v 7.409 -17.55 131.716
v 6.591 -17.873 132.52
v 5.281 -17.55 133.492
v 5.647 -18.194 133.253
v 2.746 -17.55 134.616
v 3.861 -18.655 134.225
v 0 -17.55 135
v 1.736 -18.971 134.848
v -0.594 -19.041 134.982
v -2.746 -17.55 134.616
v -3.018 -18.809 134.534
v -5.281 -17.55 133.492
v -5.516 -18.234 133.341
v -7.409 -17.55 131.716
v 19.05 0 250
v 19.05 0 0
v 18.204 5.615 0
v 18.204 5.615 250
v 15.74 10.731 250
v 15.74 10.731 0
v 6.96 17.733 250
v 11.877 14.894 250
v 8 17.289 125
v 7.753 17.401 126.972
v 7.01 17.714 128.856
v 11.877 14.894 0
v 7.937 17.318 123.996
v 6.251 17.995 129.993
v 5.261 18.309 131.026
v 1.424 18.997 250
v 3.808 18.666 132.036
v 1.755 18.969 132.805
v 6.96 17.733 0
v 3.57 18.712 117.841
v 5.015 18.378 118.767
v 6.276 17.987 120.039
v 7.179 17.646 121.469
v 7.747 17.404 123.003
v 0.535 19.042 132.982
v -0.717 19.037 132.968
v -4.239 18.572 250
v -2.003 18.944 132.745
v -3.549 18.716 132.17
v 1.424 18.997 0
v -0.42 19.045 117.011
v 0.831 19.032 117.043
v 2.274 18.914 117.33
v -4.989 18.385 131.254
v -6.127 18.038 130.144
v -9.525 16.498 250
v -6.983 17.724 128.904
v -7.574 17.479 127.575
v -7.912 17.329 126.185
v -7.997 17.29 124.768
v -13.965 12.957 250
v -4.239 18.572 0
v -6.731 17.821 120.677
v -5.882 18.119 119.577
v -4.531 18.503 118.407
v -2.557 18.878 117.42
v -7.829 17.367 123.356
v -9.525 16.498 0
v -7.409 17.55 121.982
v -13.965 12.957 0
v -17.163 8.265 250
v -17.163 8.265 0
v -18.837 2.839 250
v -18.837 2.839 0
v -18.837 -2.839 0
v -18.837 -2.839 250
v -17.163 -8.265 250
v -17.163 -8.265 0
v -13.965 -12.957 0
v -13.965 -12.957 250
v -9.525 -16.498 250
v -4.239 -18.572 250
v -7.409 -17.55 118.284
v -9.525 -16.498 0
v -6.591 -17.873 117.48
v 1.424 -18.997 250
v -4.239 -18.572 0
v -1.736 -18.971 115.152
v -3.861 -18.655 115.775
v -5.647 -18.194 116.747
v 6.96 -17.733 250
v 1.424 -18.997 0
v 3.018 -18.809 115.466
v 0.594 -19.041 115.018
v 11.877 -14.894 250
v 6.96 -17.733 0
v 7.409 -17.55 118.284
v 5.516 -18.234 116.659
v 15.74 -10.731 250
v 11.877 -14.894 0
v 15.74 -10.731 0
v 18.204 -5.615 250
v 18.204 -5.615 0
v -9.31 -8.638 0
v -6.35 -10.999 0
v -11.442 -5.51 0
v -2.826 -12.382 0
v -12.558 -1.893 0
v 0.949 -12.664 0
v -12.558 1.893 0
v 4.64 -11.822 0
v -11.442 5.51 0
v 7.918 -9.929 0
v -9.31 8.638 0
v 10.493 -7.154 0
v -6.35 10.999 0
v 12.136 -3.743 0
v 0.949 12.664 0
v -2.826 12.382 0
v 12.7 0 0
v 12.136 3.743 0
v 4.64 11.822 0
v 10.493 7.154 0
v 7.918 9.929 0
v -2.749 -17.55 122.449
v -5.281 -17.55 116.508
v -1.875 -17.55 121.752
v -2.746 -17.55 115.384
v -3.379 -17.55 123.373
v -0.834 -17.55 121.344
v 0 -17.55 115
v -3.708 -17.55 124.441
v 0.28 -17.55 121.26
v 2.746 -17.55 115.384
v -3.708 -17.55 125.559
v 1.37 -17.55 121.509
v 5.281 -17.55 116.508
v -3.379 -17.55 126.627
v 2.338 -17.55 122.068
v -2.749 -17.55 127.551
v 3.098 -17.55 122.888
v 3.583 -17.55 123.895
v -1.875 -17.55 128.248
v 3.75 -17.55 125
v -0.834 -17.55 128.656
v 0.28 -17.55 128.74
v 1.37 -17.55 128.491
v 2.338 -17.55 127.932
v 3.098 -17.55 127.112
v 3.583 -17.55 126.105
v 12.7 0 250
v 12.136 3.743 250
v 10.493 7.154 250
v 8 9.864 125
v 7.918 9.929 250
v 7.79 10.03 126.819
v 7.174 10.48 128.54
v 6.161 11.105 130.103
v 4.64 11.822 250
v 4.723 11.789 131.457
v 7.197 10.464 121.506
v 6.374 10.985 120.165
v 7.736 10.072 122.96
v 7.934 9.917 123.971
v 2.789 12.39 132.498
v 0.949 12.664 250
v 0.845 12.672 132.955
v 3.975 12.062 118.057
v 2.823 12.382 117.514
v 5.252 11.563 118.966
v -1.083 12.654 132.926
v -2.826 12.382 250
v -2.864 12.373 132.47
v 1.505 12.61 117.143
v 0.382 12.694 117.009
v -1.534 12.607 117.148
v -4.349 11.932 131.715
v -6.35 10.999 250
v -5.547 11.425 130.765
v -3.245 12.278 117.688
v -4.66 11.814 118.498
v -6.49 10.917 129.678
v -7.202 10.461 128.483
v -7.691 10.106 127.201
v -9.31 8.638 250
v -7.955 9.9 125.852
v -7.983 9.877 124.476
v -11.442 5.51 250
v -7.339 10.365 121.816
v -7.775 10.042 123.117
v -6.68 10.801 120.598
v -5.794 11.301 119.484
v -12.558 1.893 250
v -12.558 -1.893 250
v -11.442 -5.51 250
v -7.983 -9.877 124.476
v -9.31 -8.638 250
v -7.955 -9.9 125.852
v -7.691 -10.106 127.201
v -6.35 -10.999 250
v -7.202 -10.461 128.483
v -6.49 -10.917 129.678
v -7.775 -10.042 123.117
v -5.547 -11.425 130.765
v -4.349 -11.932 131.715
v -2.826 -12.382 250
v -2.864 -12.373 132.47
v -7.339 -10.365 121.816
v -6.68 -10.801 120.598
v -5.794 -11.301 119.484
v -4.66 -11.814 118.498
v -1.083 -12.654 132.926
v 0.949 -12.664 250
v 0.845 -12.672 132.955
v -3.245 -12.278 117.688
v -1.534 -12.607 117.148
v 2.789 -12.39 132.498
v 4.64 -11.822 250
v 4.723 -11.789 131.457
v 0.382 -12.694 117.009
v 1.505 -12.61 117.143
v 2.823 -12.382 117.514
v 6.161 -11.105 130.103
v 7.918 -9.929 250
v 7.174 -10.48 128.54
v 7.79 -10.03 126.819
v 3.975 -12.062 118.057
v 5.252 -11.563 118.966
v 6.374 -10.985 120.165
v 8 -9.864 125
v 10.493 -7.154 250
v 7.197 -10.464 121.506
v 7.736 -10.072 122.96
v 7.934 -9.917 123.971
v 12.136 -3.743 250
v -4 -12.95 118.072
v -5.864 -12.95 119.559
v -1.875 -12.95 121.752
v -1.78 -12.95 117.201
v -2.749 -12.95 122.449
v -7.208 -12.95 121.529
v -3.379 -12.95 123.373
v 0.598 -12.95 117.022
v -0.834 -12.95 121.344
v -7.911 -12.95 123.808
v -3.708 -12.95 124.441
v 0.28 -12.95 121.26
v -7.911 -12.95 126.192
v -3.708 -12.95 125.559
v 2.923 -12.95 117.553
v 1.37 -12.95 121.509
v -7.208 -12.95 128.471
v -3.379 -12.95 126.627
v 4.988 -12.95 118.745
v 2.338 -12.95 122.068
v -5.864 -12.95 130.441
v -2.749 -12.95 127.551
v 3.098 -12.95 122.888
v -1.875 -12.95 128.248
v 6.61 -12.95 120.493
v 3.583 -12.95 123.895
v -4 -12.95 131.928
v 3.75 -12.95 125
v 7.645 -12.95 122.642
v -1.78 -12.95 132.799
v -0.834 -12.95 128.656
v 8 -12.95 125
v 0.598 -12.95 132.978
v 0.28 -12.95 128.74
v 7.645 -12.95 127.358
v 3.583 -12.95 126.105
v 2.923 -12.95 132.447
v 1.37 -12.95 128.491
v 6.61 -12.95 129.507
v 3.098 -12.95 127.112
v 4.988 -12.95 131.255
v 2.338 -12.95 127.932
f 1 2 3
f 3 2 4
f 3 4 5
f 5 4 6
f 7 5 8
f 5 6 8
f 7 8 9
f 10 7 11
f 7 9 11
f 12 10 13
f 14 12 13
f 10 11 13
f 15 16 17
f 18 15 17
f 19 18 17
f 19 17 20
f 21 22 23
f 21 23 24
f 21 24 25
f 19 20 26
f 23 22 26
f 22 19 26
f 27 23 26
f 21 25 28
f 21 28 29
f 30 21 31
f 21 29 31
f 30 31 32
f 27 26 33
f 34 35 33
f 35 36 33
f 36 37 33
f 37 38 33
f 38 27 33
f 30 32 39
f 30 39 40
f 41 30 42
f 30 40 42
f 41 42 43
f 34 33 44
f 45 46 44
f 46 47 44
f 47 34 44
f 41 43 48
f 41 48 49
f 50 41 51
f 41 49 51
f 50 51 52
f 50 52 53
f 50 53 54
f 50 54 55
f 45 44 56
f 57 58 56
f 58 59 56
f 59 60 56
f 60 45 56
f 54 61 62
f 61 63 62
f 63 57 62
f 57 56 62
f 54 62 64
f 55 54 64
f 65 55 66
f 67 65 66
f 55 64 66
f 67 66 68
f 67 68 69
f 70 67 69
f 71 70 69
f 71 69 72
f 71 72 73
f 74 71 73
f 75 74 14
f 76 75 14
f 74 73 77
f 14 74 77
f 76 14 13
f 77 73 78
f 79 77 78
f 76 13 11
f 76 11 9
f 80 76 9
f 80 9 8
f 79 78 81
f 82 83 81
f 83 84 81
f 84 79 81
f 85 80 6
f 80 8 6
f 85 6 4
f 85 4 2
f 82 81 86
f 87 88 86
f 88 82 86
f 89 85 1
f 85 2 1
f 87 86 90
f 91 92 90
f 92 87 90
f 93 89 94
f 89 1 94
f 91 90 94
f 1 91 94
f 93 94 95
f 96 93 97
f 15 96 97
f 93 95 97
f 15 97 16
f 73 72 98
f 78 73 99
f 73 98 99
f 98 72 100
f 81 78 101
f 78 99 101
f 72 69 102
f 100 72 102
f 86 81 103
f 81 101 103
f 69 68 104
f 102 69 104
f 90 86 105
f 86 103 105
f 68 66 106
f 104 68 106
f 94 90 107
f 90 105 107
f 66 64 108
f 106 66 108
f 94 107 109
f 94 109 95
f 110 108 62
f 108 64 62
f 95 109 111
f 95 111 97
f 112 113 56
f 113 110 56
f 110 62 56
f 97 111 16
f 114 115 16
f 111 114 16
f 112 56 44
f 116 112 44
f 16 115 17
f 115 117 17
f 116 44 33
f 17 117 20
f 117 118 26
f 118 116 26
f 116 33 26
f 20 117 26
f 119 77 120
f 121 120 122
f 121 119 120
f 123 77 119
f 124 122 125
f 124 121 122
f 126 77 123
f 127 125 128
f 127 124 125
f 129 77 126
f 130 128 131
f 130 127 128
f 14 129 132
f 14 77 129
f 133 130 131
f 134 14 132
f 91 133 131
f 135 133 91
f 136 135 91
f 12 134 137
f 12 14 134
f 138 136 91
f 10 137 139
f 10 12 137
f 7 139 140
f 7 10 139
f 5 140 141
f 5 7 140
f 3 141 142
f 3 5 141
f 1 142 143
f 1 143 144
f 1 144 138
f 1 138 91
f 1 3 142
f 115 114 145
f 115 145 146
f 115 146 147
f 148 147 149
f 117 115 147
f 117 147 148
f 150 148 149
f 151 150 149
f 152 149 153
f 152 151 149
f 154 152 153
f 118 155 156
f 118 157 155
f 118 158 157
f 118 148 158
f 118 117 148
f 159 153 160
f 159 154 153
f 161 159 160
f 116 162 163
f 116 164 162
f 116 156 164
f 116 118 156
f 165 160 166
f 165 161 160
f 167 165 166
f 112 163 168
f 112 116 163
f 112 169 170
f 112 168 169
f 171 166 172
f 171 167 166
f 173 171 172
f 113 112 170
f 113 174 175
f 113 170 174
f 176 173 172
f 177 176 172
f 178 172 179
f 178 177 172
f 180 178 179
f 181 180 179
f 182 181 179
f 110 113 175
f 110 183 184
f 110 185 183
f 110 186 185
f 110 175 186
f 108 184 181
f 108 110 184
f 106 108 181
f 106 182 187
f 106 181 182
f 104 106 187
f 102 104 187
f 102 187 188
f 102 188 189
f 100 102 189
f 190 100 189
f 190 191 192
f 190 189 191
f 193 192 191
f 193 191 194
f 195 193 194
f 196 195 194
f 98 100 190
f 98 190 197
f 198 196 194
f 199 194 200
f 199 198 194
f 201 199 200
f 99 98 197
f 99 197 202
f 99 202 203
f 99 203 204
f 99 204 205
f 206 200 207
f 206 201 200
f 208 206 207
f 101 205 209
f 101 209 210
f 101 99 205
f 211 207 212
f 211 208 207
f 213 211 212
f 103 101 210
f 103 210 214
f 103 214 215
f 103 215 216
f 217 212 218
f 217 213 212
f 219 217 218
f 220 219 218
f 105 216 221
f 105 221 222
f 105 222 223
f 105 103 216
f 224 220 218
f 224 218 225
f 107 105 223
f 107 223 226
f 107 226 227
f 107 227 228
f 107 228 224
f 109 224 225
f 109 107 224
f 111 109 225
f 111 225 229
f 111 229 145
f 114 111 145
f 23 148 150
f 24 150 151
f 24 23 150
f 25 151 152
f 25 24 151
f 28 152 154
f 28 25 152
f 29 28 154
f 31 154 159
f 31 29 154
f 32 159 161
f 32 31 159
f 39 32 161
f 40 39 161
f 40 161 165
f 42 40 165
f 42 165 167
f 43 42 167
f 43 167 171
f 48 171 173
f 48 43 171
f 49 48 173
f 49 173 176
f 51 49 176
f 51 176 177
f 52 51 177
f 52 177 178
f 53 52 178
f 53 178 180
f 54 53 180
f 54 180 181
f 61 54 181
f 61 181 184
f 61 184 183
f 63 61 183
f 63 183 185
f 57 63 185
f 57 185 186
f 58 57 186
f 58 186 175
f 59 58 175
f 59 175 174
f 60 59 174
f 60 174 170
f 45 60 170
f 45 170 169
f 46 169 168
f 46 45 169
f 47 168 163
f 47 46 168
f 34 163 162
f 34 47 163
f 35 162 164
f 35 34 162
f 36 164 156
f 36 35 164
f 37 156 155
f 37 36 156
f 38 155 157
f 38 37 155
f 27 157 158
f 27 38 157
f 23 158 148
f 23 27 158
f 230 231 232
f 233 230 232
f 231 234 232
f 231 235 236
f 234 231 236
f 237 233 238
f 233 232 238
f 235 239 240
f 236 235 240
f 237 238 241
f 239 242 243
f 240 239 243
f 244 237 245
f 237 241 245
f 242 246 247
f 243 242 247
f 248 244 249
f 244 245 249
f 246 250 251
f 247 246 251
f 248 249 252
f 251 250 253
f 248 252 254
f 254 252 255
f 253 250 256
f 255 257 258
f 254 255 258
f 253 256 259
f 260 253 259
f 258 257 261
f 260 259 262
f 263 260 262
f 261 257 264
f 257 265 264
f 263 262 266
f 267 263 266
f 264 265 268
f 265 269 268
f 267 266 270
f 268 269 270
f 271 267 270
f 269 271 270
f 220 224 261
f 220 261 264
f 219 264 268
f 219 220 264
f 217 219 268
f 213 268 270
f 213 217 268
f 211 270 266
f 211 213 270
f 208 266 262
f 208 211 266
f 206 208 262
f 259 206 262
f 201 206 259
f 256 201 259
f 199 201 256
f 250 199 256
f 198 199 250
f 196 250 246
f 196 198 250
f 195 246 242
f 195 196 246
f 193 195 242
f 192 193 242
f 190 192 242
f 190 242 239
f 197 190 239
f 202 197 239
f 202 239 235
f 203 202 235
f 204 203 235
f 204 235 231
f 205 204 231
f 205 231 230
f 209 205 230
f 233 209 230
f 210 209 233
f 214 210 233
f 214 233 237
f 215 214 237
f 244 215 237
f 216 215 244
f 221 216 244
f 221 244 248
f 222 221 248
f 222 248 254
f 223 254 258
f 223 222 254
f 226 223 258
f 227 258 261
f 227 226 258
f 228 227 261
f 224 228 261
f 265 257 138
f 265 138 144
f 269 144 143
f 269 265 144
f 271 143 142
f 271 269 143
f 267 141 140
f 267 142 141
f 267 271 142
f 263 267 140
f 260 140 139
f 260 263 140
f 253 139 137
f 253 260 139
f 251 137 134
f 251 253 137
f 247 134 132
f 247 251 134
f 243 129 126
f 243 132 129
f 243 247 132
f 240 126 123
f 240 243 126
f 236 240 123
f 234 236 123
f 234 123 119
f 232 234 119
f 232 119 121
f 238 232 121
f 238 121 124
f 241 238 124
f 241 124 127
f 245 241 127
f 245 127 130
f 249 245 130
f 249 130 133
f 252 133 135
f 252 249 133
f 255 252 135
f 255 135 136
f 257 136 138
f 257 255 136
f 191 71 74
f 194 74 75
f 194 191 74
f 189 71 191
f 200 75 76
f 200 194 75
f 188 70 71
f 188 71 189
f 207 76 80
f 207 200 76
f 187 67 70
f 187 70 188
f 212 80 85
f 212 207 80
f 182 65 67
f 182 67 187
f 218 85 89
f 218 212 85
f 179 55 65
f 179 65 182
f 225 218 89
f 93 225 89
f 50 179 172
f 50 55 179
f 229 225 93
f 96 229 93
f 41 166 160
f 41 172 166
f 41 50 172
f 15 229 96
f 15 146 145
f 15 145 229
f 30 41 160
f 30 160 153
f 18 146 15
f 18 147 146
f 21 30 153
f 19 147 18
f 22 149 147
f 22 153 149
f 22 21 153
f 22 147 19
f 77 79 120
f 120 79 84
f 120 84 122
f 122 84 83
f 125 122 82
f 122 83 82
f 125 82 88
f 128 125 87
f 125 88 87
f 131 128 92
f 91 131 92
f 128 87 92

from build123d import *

# Parameters (mm, degrees)
F0_R      = 19.05
F0_R_2    = 12.7
F1_DEPTH  = 250
F2_R      = 3.75
F3_DEPTH  = 19.051
F4_DEPTH  = 19.051
F6_R      = 8
F7_DEPTH  = 32
F9_R      = 10
F10_DEPTH = 1.5


with BuildPart() as f1:
    # F0 (on Top) → F1 (new body)
    with BuildSketch(Plane.XY):
        Circle(F0_R)
        Circle(F0_R_2, mode=Mode.SUBTRACT)
    extrude(amount=F1_DEPTH)

    # F2 (on Front) → F3 (cut, through all)
    with BuildSketch(Plane.XZ):
        with Locations((0, 125)):
            Circle(F2_R)
    extrude(amount=-F3_DEPTH, mode=Mode.SUBTRACT)

    # F2 (on Front) → F4 (cut, through all)
    with BuildSketch(Plane.XZ):
        with Locations((0, 125)):
            Circle(F2_R)
    extrude(amount=F4_DEPTH, mode=Mode.SUBTRACT)

    # F6 (on offset) → F7 (cut)
    with BuildSketch(Plane.XZ.offset(-19.05)):
        with Locations((0, 125)):
            Circle(F6_R)
    extrude(amount=F7_DEPTH, mode=Mode.SUBTRACT)

    # F9 (on offset) → F10 (cut)
    with BuildSketch(Plane.XZ.offset(19.05)):
        with Locations((0, 125)):
            Circle(F9_R)
    extrude(amount=-F10_DEPTH, mode=Mode.SUBTRACT)


solid = f1.part
